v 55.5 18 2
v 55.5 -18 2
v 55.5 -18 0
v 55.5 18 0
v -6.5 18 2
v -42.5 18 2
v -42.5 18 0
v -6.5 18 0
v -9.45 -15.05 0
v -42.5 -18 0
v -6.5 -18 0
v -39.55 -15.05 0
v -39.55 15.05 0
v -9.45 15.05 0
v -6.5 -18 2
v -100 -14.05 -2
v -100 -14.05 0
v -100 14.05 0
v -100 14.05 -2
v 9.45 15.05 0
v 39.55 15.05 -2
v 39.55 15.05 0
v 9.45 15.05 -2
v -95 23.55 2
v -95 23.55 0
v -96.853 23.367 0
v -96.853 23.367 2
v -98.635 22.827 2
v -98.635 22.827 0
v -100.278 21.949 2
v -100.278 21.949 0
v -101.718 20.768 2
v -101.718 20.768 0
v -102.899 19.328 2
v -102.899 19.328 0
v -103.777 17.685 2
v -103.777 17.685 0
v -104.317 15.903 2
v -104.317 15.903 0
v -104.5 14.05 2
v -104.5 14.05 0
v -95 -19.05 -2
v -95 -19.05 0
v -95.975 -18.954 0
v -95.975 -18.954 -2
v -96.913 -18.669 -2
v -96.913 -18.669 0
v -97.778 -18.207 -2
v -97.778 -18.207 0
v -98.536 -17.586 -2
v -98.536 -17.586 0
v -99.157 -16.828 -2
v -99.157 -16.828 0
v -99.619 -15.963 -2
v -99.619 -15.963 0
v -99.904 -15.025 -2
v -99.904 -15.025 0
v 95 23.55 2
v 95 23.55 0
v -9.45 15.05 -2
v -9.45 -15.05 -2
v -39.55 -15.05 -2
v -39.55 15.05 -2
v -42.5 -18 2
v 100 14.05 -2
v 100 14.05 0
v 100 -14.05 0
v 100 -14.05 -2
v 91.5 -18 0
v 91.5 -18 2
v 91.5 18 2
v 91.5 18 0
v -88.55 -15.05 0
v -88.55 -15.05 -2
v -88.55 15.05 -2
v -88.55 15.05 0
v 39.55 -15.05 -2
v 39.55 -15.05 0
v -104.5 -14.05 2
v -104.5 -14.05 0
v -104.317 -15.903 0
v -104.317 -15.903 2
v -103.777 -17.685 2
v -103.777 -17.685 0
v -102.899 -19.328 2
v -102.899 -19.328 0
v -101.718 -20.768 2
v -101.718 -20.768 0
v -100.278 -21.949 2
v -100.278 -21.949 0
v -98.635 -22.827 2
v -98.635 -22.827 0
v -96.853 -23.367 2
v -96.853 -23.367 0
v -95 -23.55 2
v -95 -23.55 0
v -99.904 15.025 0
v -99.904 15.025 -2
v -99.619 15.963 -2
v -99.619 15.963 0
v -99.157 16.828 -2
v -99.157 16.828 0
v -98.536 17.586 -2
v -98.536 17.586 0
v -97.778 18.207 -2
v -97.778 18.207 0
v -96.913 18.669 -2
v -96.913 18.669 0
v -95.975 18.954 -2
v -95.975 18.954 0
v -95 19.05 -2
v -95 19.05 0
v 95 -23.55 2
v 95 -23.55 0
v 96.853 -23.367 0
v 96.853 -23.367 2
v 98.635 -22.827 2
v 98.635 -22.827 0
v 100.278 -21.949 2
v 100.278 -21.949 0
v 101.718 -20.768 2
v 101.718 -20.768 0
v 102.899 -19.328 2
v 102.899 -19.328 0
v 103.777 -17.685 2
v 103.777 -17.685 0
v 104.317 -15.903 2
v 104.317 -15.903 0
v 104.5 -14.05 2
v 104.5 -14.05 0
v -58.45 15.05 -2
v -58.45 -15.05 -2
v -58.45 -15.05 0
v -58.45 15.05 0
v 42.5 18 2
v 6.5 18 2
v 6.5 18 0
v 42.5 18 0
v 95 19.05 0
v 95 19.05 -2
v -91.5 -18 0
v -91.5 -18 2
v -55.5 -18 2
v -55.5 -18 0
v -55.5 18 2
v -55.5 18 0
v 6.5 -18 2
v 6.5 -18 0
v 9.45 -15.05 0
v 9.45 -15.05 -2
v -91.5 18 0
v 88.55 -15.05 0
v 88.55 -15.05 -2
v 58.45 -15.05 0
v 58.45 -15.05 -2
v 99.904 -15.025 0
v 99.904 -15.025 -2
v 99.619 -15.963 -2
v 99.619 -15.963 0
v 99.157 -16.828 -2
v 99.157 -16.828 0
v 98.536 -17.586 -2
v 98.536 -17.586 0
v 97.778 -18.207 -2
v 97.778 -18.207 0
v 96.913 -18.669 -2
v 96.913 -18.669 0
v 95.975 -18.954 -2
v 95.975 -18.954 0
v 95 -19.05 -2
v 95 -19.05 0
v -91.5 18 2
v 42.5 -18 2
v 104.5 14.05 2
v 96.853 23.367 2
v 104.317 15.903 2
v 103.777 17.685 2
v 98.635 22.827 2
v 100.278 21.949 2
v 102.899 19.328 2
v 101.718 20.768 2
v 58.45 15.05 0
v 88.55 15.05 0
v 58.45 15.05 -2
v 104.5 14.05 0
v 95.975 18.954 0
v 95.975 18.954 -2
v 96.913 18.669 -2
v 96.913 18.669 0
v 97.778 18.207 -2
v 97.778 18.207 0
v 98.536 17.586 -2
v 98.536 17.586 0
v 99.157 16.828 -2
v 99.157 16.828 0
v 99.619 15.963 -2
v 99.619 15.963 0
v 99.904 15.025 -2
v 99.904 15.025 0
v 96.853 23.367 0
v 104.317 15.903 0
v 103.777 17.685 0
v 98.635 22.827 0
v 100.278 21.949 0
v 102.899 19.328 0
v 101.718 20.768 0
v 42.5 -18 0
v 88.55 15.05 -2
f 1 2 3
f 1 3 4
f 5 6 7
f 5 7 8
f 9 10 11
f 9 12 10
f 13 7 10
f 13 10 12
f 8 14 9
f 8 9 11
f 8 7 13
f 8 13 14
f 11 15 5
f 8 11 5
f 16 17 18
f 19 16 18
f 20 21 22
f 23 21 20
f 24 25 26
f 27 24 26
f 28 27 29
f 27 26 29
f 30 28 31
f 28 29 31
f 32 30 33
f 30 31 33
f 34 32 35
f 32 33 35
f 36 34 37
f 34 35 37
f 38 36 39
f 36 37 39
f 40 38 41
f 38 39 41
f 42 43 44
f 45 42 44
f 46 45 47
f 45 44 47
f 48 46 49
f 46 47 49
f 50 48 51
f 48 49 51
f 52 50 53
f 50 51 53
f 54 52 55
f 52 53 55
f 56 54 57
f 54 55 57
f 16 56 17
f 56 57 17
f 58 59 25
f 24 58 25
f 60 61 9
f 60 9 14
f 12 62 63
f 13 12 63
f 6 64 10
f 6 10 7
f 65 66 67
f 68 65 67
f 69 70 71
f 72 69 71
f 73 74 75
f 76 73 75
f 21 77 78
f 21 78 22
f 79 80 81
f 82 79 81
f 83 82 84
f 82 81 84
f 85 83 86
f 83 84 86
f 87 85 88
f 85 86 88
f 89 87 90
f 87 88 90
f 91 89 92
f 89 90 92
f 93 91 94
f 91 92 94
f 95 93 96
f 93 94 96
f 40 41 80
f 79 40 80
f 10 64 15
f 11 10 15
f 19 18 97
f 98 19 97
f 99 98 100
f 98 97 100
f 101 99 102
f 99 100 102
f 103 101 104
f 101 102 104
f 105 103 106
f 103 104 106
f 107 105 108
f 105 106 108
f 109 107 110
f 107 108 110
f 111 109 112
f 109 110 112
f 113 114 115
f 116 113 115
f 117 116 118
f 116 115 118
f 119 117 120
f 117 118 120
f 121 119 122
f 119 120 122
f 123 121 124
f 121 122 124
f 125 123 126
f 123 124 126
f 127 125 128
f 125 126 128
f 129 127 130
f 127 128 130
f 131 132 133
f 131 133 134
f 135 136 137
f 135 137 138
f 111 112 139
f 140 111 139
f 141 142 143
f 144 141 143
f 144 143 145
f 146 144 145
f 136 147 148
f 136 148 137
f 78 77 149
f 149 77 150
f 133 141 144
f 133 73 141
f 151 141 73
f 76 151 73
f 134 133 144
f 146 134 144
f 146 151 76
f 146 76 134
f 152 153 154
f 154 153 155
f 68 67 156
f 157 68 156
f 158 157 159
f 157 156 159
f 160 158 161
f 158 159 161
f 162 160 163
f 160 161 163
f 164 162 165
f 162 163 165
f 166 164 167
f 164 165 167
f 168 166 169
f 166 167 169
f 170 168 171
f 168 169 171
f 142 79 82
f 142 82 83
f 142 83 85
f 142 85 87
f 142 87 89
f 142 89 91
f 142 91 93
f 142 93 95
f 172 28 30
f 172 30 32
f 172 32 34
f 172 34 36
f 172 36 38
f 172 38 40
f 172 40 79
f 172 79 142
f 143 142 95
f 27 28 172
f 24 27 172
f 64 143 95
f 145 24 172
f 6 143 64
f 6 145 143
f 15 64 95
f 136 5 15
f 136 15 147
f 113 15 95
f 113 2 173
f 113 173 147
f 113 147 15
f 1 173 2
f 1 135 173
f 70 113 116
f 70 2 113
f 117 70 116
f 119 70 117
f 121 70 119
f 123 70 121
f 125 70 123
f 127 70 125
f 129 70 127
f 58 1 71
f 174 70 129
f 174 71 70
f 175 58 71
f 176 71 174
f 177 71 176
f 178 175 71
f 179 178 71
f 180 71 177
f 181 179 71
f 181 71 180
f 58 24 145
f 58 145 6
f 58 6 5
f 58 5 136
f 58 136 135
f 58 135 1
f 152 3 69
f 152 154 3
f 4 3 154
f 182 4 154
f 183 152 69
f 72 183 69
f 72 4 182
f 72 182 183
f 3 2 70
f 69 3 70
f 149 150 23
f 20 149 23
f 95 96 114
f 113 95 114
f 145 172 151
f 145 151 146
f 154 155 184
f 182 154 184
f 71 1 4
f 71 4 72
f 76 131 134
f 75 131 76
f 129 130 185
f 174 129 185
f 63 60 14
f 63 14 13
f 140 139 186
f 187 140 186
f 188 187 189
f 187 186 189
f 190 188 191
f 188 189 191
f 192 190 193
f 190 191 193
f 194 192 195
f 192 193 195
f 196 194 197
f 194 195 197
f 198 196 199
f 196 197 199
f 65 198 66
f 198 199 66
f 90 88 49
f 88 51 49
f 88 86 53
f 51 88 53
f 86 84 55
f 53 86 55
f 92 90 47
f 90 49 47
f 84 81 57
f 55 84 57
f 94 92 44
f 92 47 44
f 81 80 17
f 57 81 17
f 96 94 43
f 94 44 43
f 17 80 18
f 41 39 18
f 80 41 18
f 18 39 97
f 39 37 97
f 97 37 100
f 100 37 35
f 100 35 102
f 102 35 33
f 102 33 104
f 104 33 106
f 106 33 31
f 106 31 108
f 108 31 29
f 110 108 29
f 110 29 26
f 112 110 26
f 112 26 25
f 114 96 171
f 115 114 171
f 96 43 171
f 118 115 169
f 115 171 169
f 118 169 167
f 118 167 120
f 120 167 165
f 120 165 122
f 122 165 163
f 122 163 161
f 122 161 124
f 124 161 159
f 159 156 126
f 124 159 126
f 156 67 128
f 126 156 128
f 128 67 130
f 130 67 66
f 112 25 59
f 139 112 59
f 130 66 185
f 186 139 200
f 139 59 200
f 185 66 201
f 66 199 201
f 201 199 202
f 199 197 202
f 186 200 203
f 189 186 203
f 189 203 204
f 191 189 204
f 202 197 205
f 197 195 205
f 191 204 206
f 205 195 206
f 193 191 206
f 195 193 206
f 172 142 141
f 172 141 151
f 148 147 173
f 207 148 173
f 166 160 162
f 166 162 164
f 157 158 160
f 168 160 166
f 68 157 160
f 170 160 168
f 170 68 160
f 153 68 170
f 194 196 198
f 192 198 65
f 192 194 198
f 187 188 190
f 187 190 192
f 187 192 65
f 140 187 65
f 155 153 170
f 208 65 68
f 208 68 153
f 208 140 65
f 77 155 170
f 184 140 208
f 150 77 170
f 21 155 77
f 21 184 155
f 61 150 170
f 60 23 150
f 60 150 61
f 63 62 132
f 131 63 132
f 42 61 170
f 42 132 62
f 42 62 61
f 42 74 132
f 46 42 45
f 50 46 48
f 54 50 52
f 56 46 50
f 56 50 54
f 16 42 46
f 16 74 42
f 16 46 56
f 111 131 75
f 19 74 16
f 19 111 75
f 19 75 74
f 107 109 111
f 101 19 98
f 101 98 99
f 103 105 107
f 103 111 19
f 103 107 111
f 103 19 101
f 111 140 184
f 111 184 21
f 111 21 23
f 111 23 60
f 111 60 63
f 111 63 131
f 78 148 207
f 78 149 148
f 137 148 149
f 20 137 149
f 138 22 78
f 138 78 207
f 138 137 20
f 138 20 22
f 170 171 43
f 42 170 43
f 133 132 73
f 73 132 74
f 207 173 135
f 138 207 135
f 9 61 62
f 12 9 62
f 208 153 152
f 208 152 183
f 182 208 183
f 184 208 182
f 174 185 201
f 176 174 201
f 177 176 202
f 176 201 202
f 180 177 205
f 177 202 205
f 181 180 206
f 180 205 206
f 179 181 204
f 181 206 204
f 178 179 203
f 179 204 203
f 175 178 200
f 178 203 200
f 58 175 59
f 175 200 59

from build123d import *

# Parameters (mm, degrees)
BOSS_EXTRU_1_DEPTH      = 2
BOSS_EXTRU_3_DEPTH      = 2
ESQUISSE7_W             = 36
ESQUISSE7_H             = 36
ENL_V_MAT_EXTRU_4_DEPTH = 2
ESQUISSE8_W             = 30.1
ESQUISSE8_H             = 30.1
ENL_V_MAT_EXTRU_5_DEPTH = 108.195394024


with BuildPart() as part:
    # Esquisse1 → Boss.-Extru.1 (new body)
    with BuildSketch(Plane.XY):
        with BuildLine():
            Line((-95, -23.55), (95, -23.55))
            ThreePointArc((95, -23.55), (101.717514421, -20.767514421), (104.5, -14.05))
            Line((104.5, -14.05), (104.5, 14.05))
            ThreePointArc((104.5, 14.05), (101.717514421, 20.767514421), (95, 23.55))
            Line((95, 23.55), (-95, 23.55))
            ThreePointArc((-95, 23.55), (-101.717514421, 20.767514421), (-104.5, 14.05))
            Line((-104.5, 14.05), (-104.5, -14.05))
            ThreePointArc((-104.5, -14.05), (-101.717514421, -20.767514421), (-95, -23.55))
        make_face()
    extrude(amount=BOSS_EXTRU_1_DEPTH)

    # Esquisse6 → Boss.-Extru.3 (add)
    with BuildSketch(Plane(origin=(0, 0, 0), x_dir=(-1, 0, 0), z_dir=(0, 0, -1))):
        with BuildLine():
            Line((-95, -19.05), (95, -19.05))
            ThreePointArc((95, -19.05), (98.535533906, -17.585533906), (100, -14.05))
            Line((100, -14.05), (100, 14.05))
            ThreePointArc((100, 14.05), (98.535533906, 17.585533906), (95, 19.05))
            Line((95, 19.05), (-95, 19.05))
            ThreePointArc((-95, 19.05), (-98.535533906, 17.585533906), (-100, 14.05))
            Line((-100, 14.05), (-100, -14.05))
            ThreePointArc((-100, -14.05), (-98.535533906, -17.585533906), (-95, -19.05))
        make_face()
    extrude(amount=BOSS_EXTRU_3_DEPTH)

    # Esquisse7 → Enlèv. mat.-Extru.4 (cut)
    with BuildSketch(Plane.XY.offset(2)):
        with Locations((-73.5, 0)):
            Rectangle(ESQUISSE7_W, ESQUISSE7_H)
        with Locations((-24.5, 0)):
            Rectangle(ESQUISSE7_W, ESQUISSE7_H)
        with Locations((24.5, 0)):
            Rectangle(ESQUISSE7_W, ESQUISSE7_H)
        with Locations((73.5, 0)):
            Rectangle(ESQUISSE7_W, ESQUISSE7_H)
    extrude(amount=-ENL_V_MAT_EXTRU_4_DEPTH, mode=Mode.SUBTRACT)

    # Esquisse8 → Enlèv. mat.-Extru.5 (cut, through all)
    with BuildSketch(Plane(origin=(0, 0, -2), x_dir=(-1, 0, 0), z_dir=(0, 0, -1))):
        with Locations((-73.5, 0)):
            Rectangle(ESQUISSE8_W, ESQUISSE8_H)
        with Locations((-24.5, 0)):
            Rectangle(ESQUISSE8_W, ESQUISSE8_H)
        with Locations((24.5, 0)):
            Rectangle(ESQUISSE8_W, ESQUISSE8_H)
        with Locations((73.5, 0)):
            Rectangle(ESQUISSE8_W, ESQUISSE8_H)
    extrude(amount=-ENL_V_MAT_EXTRU_5_DEPTH, mode=Mode.SUBTRACT)


solid = part.part
